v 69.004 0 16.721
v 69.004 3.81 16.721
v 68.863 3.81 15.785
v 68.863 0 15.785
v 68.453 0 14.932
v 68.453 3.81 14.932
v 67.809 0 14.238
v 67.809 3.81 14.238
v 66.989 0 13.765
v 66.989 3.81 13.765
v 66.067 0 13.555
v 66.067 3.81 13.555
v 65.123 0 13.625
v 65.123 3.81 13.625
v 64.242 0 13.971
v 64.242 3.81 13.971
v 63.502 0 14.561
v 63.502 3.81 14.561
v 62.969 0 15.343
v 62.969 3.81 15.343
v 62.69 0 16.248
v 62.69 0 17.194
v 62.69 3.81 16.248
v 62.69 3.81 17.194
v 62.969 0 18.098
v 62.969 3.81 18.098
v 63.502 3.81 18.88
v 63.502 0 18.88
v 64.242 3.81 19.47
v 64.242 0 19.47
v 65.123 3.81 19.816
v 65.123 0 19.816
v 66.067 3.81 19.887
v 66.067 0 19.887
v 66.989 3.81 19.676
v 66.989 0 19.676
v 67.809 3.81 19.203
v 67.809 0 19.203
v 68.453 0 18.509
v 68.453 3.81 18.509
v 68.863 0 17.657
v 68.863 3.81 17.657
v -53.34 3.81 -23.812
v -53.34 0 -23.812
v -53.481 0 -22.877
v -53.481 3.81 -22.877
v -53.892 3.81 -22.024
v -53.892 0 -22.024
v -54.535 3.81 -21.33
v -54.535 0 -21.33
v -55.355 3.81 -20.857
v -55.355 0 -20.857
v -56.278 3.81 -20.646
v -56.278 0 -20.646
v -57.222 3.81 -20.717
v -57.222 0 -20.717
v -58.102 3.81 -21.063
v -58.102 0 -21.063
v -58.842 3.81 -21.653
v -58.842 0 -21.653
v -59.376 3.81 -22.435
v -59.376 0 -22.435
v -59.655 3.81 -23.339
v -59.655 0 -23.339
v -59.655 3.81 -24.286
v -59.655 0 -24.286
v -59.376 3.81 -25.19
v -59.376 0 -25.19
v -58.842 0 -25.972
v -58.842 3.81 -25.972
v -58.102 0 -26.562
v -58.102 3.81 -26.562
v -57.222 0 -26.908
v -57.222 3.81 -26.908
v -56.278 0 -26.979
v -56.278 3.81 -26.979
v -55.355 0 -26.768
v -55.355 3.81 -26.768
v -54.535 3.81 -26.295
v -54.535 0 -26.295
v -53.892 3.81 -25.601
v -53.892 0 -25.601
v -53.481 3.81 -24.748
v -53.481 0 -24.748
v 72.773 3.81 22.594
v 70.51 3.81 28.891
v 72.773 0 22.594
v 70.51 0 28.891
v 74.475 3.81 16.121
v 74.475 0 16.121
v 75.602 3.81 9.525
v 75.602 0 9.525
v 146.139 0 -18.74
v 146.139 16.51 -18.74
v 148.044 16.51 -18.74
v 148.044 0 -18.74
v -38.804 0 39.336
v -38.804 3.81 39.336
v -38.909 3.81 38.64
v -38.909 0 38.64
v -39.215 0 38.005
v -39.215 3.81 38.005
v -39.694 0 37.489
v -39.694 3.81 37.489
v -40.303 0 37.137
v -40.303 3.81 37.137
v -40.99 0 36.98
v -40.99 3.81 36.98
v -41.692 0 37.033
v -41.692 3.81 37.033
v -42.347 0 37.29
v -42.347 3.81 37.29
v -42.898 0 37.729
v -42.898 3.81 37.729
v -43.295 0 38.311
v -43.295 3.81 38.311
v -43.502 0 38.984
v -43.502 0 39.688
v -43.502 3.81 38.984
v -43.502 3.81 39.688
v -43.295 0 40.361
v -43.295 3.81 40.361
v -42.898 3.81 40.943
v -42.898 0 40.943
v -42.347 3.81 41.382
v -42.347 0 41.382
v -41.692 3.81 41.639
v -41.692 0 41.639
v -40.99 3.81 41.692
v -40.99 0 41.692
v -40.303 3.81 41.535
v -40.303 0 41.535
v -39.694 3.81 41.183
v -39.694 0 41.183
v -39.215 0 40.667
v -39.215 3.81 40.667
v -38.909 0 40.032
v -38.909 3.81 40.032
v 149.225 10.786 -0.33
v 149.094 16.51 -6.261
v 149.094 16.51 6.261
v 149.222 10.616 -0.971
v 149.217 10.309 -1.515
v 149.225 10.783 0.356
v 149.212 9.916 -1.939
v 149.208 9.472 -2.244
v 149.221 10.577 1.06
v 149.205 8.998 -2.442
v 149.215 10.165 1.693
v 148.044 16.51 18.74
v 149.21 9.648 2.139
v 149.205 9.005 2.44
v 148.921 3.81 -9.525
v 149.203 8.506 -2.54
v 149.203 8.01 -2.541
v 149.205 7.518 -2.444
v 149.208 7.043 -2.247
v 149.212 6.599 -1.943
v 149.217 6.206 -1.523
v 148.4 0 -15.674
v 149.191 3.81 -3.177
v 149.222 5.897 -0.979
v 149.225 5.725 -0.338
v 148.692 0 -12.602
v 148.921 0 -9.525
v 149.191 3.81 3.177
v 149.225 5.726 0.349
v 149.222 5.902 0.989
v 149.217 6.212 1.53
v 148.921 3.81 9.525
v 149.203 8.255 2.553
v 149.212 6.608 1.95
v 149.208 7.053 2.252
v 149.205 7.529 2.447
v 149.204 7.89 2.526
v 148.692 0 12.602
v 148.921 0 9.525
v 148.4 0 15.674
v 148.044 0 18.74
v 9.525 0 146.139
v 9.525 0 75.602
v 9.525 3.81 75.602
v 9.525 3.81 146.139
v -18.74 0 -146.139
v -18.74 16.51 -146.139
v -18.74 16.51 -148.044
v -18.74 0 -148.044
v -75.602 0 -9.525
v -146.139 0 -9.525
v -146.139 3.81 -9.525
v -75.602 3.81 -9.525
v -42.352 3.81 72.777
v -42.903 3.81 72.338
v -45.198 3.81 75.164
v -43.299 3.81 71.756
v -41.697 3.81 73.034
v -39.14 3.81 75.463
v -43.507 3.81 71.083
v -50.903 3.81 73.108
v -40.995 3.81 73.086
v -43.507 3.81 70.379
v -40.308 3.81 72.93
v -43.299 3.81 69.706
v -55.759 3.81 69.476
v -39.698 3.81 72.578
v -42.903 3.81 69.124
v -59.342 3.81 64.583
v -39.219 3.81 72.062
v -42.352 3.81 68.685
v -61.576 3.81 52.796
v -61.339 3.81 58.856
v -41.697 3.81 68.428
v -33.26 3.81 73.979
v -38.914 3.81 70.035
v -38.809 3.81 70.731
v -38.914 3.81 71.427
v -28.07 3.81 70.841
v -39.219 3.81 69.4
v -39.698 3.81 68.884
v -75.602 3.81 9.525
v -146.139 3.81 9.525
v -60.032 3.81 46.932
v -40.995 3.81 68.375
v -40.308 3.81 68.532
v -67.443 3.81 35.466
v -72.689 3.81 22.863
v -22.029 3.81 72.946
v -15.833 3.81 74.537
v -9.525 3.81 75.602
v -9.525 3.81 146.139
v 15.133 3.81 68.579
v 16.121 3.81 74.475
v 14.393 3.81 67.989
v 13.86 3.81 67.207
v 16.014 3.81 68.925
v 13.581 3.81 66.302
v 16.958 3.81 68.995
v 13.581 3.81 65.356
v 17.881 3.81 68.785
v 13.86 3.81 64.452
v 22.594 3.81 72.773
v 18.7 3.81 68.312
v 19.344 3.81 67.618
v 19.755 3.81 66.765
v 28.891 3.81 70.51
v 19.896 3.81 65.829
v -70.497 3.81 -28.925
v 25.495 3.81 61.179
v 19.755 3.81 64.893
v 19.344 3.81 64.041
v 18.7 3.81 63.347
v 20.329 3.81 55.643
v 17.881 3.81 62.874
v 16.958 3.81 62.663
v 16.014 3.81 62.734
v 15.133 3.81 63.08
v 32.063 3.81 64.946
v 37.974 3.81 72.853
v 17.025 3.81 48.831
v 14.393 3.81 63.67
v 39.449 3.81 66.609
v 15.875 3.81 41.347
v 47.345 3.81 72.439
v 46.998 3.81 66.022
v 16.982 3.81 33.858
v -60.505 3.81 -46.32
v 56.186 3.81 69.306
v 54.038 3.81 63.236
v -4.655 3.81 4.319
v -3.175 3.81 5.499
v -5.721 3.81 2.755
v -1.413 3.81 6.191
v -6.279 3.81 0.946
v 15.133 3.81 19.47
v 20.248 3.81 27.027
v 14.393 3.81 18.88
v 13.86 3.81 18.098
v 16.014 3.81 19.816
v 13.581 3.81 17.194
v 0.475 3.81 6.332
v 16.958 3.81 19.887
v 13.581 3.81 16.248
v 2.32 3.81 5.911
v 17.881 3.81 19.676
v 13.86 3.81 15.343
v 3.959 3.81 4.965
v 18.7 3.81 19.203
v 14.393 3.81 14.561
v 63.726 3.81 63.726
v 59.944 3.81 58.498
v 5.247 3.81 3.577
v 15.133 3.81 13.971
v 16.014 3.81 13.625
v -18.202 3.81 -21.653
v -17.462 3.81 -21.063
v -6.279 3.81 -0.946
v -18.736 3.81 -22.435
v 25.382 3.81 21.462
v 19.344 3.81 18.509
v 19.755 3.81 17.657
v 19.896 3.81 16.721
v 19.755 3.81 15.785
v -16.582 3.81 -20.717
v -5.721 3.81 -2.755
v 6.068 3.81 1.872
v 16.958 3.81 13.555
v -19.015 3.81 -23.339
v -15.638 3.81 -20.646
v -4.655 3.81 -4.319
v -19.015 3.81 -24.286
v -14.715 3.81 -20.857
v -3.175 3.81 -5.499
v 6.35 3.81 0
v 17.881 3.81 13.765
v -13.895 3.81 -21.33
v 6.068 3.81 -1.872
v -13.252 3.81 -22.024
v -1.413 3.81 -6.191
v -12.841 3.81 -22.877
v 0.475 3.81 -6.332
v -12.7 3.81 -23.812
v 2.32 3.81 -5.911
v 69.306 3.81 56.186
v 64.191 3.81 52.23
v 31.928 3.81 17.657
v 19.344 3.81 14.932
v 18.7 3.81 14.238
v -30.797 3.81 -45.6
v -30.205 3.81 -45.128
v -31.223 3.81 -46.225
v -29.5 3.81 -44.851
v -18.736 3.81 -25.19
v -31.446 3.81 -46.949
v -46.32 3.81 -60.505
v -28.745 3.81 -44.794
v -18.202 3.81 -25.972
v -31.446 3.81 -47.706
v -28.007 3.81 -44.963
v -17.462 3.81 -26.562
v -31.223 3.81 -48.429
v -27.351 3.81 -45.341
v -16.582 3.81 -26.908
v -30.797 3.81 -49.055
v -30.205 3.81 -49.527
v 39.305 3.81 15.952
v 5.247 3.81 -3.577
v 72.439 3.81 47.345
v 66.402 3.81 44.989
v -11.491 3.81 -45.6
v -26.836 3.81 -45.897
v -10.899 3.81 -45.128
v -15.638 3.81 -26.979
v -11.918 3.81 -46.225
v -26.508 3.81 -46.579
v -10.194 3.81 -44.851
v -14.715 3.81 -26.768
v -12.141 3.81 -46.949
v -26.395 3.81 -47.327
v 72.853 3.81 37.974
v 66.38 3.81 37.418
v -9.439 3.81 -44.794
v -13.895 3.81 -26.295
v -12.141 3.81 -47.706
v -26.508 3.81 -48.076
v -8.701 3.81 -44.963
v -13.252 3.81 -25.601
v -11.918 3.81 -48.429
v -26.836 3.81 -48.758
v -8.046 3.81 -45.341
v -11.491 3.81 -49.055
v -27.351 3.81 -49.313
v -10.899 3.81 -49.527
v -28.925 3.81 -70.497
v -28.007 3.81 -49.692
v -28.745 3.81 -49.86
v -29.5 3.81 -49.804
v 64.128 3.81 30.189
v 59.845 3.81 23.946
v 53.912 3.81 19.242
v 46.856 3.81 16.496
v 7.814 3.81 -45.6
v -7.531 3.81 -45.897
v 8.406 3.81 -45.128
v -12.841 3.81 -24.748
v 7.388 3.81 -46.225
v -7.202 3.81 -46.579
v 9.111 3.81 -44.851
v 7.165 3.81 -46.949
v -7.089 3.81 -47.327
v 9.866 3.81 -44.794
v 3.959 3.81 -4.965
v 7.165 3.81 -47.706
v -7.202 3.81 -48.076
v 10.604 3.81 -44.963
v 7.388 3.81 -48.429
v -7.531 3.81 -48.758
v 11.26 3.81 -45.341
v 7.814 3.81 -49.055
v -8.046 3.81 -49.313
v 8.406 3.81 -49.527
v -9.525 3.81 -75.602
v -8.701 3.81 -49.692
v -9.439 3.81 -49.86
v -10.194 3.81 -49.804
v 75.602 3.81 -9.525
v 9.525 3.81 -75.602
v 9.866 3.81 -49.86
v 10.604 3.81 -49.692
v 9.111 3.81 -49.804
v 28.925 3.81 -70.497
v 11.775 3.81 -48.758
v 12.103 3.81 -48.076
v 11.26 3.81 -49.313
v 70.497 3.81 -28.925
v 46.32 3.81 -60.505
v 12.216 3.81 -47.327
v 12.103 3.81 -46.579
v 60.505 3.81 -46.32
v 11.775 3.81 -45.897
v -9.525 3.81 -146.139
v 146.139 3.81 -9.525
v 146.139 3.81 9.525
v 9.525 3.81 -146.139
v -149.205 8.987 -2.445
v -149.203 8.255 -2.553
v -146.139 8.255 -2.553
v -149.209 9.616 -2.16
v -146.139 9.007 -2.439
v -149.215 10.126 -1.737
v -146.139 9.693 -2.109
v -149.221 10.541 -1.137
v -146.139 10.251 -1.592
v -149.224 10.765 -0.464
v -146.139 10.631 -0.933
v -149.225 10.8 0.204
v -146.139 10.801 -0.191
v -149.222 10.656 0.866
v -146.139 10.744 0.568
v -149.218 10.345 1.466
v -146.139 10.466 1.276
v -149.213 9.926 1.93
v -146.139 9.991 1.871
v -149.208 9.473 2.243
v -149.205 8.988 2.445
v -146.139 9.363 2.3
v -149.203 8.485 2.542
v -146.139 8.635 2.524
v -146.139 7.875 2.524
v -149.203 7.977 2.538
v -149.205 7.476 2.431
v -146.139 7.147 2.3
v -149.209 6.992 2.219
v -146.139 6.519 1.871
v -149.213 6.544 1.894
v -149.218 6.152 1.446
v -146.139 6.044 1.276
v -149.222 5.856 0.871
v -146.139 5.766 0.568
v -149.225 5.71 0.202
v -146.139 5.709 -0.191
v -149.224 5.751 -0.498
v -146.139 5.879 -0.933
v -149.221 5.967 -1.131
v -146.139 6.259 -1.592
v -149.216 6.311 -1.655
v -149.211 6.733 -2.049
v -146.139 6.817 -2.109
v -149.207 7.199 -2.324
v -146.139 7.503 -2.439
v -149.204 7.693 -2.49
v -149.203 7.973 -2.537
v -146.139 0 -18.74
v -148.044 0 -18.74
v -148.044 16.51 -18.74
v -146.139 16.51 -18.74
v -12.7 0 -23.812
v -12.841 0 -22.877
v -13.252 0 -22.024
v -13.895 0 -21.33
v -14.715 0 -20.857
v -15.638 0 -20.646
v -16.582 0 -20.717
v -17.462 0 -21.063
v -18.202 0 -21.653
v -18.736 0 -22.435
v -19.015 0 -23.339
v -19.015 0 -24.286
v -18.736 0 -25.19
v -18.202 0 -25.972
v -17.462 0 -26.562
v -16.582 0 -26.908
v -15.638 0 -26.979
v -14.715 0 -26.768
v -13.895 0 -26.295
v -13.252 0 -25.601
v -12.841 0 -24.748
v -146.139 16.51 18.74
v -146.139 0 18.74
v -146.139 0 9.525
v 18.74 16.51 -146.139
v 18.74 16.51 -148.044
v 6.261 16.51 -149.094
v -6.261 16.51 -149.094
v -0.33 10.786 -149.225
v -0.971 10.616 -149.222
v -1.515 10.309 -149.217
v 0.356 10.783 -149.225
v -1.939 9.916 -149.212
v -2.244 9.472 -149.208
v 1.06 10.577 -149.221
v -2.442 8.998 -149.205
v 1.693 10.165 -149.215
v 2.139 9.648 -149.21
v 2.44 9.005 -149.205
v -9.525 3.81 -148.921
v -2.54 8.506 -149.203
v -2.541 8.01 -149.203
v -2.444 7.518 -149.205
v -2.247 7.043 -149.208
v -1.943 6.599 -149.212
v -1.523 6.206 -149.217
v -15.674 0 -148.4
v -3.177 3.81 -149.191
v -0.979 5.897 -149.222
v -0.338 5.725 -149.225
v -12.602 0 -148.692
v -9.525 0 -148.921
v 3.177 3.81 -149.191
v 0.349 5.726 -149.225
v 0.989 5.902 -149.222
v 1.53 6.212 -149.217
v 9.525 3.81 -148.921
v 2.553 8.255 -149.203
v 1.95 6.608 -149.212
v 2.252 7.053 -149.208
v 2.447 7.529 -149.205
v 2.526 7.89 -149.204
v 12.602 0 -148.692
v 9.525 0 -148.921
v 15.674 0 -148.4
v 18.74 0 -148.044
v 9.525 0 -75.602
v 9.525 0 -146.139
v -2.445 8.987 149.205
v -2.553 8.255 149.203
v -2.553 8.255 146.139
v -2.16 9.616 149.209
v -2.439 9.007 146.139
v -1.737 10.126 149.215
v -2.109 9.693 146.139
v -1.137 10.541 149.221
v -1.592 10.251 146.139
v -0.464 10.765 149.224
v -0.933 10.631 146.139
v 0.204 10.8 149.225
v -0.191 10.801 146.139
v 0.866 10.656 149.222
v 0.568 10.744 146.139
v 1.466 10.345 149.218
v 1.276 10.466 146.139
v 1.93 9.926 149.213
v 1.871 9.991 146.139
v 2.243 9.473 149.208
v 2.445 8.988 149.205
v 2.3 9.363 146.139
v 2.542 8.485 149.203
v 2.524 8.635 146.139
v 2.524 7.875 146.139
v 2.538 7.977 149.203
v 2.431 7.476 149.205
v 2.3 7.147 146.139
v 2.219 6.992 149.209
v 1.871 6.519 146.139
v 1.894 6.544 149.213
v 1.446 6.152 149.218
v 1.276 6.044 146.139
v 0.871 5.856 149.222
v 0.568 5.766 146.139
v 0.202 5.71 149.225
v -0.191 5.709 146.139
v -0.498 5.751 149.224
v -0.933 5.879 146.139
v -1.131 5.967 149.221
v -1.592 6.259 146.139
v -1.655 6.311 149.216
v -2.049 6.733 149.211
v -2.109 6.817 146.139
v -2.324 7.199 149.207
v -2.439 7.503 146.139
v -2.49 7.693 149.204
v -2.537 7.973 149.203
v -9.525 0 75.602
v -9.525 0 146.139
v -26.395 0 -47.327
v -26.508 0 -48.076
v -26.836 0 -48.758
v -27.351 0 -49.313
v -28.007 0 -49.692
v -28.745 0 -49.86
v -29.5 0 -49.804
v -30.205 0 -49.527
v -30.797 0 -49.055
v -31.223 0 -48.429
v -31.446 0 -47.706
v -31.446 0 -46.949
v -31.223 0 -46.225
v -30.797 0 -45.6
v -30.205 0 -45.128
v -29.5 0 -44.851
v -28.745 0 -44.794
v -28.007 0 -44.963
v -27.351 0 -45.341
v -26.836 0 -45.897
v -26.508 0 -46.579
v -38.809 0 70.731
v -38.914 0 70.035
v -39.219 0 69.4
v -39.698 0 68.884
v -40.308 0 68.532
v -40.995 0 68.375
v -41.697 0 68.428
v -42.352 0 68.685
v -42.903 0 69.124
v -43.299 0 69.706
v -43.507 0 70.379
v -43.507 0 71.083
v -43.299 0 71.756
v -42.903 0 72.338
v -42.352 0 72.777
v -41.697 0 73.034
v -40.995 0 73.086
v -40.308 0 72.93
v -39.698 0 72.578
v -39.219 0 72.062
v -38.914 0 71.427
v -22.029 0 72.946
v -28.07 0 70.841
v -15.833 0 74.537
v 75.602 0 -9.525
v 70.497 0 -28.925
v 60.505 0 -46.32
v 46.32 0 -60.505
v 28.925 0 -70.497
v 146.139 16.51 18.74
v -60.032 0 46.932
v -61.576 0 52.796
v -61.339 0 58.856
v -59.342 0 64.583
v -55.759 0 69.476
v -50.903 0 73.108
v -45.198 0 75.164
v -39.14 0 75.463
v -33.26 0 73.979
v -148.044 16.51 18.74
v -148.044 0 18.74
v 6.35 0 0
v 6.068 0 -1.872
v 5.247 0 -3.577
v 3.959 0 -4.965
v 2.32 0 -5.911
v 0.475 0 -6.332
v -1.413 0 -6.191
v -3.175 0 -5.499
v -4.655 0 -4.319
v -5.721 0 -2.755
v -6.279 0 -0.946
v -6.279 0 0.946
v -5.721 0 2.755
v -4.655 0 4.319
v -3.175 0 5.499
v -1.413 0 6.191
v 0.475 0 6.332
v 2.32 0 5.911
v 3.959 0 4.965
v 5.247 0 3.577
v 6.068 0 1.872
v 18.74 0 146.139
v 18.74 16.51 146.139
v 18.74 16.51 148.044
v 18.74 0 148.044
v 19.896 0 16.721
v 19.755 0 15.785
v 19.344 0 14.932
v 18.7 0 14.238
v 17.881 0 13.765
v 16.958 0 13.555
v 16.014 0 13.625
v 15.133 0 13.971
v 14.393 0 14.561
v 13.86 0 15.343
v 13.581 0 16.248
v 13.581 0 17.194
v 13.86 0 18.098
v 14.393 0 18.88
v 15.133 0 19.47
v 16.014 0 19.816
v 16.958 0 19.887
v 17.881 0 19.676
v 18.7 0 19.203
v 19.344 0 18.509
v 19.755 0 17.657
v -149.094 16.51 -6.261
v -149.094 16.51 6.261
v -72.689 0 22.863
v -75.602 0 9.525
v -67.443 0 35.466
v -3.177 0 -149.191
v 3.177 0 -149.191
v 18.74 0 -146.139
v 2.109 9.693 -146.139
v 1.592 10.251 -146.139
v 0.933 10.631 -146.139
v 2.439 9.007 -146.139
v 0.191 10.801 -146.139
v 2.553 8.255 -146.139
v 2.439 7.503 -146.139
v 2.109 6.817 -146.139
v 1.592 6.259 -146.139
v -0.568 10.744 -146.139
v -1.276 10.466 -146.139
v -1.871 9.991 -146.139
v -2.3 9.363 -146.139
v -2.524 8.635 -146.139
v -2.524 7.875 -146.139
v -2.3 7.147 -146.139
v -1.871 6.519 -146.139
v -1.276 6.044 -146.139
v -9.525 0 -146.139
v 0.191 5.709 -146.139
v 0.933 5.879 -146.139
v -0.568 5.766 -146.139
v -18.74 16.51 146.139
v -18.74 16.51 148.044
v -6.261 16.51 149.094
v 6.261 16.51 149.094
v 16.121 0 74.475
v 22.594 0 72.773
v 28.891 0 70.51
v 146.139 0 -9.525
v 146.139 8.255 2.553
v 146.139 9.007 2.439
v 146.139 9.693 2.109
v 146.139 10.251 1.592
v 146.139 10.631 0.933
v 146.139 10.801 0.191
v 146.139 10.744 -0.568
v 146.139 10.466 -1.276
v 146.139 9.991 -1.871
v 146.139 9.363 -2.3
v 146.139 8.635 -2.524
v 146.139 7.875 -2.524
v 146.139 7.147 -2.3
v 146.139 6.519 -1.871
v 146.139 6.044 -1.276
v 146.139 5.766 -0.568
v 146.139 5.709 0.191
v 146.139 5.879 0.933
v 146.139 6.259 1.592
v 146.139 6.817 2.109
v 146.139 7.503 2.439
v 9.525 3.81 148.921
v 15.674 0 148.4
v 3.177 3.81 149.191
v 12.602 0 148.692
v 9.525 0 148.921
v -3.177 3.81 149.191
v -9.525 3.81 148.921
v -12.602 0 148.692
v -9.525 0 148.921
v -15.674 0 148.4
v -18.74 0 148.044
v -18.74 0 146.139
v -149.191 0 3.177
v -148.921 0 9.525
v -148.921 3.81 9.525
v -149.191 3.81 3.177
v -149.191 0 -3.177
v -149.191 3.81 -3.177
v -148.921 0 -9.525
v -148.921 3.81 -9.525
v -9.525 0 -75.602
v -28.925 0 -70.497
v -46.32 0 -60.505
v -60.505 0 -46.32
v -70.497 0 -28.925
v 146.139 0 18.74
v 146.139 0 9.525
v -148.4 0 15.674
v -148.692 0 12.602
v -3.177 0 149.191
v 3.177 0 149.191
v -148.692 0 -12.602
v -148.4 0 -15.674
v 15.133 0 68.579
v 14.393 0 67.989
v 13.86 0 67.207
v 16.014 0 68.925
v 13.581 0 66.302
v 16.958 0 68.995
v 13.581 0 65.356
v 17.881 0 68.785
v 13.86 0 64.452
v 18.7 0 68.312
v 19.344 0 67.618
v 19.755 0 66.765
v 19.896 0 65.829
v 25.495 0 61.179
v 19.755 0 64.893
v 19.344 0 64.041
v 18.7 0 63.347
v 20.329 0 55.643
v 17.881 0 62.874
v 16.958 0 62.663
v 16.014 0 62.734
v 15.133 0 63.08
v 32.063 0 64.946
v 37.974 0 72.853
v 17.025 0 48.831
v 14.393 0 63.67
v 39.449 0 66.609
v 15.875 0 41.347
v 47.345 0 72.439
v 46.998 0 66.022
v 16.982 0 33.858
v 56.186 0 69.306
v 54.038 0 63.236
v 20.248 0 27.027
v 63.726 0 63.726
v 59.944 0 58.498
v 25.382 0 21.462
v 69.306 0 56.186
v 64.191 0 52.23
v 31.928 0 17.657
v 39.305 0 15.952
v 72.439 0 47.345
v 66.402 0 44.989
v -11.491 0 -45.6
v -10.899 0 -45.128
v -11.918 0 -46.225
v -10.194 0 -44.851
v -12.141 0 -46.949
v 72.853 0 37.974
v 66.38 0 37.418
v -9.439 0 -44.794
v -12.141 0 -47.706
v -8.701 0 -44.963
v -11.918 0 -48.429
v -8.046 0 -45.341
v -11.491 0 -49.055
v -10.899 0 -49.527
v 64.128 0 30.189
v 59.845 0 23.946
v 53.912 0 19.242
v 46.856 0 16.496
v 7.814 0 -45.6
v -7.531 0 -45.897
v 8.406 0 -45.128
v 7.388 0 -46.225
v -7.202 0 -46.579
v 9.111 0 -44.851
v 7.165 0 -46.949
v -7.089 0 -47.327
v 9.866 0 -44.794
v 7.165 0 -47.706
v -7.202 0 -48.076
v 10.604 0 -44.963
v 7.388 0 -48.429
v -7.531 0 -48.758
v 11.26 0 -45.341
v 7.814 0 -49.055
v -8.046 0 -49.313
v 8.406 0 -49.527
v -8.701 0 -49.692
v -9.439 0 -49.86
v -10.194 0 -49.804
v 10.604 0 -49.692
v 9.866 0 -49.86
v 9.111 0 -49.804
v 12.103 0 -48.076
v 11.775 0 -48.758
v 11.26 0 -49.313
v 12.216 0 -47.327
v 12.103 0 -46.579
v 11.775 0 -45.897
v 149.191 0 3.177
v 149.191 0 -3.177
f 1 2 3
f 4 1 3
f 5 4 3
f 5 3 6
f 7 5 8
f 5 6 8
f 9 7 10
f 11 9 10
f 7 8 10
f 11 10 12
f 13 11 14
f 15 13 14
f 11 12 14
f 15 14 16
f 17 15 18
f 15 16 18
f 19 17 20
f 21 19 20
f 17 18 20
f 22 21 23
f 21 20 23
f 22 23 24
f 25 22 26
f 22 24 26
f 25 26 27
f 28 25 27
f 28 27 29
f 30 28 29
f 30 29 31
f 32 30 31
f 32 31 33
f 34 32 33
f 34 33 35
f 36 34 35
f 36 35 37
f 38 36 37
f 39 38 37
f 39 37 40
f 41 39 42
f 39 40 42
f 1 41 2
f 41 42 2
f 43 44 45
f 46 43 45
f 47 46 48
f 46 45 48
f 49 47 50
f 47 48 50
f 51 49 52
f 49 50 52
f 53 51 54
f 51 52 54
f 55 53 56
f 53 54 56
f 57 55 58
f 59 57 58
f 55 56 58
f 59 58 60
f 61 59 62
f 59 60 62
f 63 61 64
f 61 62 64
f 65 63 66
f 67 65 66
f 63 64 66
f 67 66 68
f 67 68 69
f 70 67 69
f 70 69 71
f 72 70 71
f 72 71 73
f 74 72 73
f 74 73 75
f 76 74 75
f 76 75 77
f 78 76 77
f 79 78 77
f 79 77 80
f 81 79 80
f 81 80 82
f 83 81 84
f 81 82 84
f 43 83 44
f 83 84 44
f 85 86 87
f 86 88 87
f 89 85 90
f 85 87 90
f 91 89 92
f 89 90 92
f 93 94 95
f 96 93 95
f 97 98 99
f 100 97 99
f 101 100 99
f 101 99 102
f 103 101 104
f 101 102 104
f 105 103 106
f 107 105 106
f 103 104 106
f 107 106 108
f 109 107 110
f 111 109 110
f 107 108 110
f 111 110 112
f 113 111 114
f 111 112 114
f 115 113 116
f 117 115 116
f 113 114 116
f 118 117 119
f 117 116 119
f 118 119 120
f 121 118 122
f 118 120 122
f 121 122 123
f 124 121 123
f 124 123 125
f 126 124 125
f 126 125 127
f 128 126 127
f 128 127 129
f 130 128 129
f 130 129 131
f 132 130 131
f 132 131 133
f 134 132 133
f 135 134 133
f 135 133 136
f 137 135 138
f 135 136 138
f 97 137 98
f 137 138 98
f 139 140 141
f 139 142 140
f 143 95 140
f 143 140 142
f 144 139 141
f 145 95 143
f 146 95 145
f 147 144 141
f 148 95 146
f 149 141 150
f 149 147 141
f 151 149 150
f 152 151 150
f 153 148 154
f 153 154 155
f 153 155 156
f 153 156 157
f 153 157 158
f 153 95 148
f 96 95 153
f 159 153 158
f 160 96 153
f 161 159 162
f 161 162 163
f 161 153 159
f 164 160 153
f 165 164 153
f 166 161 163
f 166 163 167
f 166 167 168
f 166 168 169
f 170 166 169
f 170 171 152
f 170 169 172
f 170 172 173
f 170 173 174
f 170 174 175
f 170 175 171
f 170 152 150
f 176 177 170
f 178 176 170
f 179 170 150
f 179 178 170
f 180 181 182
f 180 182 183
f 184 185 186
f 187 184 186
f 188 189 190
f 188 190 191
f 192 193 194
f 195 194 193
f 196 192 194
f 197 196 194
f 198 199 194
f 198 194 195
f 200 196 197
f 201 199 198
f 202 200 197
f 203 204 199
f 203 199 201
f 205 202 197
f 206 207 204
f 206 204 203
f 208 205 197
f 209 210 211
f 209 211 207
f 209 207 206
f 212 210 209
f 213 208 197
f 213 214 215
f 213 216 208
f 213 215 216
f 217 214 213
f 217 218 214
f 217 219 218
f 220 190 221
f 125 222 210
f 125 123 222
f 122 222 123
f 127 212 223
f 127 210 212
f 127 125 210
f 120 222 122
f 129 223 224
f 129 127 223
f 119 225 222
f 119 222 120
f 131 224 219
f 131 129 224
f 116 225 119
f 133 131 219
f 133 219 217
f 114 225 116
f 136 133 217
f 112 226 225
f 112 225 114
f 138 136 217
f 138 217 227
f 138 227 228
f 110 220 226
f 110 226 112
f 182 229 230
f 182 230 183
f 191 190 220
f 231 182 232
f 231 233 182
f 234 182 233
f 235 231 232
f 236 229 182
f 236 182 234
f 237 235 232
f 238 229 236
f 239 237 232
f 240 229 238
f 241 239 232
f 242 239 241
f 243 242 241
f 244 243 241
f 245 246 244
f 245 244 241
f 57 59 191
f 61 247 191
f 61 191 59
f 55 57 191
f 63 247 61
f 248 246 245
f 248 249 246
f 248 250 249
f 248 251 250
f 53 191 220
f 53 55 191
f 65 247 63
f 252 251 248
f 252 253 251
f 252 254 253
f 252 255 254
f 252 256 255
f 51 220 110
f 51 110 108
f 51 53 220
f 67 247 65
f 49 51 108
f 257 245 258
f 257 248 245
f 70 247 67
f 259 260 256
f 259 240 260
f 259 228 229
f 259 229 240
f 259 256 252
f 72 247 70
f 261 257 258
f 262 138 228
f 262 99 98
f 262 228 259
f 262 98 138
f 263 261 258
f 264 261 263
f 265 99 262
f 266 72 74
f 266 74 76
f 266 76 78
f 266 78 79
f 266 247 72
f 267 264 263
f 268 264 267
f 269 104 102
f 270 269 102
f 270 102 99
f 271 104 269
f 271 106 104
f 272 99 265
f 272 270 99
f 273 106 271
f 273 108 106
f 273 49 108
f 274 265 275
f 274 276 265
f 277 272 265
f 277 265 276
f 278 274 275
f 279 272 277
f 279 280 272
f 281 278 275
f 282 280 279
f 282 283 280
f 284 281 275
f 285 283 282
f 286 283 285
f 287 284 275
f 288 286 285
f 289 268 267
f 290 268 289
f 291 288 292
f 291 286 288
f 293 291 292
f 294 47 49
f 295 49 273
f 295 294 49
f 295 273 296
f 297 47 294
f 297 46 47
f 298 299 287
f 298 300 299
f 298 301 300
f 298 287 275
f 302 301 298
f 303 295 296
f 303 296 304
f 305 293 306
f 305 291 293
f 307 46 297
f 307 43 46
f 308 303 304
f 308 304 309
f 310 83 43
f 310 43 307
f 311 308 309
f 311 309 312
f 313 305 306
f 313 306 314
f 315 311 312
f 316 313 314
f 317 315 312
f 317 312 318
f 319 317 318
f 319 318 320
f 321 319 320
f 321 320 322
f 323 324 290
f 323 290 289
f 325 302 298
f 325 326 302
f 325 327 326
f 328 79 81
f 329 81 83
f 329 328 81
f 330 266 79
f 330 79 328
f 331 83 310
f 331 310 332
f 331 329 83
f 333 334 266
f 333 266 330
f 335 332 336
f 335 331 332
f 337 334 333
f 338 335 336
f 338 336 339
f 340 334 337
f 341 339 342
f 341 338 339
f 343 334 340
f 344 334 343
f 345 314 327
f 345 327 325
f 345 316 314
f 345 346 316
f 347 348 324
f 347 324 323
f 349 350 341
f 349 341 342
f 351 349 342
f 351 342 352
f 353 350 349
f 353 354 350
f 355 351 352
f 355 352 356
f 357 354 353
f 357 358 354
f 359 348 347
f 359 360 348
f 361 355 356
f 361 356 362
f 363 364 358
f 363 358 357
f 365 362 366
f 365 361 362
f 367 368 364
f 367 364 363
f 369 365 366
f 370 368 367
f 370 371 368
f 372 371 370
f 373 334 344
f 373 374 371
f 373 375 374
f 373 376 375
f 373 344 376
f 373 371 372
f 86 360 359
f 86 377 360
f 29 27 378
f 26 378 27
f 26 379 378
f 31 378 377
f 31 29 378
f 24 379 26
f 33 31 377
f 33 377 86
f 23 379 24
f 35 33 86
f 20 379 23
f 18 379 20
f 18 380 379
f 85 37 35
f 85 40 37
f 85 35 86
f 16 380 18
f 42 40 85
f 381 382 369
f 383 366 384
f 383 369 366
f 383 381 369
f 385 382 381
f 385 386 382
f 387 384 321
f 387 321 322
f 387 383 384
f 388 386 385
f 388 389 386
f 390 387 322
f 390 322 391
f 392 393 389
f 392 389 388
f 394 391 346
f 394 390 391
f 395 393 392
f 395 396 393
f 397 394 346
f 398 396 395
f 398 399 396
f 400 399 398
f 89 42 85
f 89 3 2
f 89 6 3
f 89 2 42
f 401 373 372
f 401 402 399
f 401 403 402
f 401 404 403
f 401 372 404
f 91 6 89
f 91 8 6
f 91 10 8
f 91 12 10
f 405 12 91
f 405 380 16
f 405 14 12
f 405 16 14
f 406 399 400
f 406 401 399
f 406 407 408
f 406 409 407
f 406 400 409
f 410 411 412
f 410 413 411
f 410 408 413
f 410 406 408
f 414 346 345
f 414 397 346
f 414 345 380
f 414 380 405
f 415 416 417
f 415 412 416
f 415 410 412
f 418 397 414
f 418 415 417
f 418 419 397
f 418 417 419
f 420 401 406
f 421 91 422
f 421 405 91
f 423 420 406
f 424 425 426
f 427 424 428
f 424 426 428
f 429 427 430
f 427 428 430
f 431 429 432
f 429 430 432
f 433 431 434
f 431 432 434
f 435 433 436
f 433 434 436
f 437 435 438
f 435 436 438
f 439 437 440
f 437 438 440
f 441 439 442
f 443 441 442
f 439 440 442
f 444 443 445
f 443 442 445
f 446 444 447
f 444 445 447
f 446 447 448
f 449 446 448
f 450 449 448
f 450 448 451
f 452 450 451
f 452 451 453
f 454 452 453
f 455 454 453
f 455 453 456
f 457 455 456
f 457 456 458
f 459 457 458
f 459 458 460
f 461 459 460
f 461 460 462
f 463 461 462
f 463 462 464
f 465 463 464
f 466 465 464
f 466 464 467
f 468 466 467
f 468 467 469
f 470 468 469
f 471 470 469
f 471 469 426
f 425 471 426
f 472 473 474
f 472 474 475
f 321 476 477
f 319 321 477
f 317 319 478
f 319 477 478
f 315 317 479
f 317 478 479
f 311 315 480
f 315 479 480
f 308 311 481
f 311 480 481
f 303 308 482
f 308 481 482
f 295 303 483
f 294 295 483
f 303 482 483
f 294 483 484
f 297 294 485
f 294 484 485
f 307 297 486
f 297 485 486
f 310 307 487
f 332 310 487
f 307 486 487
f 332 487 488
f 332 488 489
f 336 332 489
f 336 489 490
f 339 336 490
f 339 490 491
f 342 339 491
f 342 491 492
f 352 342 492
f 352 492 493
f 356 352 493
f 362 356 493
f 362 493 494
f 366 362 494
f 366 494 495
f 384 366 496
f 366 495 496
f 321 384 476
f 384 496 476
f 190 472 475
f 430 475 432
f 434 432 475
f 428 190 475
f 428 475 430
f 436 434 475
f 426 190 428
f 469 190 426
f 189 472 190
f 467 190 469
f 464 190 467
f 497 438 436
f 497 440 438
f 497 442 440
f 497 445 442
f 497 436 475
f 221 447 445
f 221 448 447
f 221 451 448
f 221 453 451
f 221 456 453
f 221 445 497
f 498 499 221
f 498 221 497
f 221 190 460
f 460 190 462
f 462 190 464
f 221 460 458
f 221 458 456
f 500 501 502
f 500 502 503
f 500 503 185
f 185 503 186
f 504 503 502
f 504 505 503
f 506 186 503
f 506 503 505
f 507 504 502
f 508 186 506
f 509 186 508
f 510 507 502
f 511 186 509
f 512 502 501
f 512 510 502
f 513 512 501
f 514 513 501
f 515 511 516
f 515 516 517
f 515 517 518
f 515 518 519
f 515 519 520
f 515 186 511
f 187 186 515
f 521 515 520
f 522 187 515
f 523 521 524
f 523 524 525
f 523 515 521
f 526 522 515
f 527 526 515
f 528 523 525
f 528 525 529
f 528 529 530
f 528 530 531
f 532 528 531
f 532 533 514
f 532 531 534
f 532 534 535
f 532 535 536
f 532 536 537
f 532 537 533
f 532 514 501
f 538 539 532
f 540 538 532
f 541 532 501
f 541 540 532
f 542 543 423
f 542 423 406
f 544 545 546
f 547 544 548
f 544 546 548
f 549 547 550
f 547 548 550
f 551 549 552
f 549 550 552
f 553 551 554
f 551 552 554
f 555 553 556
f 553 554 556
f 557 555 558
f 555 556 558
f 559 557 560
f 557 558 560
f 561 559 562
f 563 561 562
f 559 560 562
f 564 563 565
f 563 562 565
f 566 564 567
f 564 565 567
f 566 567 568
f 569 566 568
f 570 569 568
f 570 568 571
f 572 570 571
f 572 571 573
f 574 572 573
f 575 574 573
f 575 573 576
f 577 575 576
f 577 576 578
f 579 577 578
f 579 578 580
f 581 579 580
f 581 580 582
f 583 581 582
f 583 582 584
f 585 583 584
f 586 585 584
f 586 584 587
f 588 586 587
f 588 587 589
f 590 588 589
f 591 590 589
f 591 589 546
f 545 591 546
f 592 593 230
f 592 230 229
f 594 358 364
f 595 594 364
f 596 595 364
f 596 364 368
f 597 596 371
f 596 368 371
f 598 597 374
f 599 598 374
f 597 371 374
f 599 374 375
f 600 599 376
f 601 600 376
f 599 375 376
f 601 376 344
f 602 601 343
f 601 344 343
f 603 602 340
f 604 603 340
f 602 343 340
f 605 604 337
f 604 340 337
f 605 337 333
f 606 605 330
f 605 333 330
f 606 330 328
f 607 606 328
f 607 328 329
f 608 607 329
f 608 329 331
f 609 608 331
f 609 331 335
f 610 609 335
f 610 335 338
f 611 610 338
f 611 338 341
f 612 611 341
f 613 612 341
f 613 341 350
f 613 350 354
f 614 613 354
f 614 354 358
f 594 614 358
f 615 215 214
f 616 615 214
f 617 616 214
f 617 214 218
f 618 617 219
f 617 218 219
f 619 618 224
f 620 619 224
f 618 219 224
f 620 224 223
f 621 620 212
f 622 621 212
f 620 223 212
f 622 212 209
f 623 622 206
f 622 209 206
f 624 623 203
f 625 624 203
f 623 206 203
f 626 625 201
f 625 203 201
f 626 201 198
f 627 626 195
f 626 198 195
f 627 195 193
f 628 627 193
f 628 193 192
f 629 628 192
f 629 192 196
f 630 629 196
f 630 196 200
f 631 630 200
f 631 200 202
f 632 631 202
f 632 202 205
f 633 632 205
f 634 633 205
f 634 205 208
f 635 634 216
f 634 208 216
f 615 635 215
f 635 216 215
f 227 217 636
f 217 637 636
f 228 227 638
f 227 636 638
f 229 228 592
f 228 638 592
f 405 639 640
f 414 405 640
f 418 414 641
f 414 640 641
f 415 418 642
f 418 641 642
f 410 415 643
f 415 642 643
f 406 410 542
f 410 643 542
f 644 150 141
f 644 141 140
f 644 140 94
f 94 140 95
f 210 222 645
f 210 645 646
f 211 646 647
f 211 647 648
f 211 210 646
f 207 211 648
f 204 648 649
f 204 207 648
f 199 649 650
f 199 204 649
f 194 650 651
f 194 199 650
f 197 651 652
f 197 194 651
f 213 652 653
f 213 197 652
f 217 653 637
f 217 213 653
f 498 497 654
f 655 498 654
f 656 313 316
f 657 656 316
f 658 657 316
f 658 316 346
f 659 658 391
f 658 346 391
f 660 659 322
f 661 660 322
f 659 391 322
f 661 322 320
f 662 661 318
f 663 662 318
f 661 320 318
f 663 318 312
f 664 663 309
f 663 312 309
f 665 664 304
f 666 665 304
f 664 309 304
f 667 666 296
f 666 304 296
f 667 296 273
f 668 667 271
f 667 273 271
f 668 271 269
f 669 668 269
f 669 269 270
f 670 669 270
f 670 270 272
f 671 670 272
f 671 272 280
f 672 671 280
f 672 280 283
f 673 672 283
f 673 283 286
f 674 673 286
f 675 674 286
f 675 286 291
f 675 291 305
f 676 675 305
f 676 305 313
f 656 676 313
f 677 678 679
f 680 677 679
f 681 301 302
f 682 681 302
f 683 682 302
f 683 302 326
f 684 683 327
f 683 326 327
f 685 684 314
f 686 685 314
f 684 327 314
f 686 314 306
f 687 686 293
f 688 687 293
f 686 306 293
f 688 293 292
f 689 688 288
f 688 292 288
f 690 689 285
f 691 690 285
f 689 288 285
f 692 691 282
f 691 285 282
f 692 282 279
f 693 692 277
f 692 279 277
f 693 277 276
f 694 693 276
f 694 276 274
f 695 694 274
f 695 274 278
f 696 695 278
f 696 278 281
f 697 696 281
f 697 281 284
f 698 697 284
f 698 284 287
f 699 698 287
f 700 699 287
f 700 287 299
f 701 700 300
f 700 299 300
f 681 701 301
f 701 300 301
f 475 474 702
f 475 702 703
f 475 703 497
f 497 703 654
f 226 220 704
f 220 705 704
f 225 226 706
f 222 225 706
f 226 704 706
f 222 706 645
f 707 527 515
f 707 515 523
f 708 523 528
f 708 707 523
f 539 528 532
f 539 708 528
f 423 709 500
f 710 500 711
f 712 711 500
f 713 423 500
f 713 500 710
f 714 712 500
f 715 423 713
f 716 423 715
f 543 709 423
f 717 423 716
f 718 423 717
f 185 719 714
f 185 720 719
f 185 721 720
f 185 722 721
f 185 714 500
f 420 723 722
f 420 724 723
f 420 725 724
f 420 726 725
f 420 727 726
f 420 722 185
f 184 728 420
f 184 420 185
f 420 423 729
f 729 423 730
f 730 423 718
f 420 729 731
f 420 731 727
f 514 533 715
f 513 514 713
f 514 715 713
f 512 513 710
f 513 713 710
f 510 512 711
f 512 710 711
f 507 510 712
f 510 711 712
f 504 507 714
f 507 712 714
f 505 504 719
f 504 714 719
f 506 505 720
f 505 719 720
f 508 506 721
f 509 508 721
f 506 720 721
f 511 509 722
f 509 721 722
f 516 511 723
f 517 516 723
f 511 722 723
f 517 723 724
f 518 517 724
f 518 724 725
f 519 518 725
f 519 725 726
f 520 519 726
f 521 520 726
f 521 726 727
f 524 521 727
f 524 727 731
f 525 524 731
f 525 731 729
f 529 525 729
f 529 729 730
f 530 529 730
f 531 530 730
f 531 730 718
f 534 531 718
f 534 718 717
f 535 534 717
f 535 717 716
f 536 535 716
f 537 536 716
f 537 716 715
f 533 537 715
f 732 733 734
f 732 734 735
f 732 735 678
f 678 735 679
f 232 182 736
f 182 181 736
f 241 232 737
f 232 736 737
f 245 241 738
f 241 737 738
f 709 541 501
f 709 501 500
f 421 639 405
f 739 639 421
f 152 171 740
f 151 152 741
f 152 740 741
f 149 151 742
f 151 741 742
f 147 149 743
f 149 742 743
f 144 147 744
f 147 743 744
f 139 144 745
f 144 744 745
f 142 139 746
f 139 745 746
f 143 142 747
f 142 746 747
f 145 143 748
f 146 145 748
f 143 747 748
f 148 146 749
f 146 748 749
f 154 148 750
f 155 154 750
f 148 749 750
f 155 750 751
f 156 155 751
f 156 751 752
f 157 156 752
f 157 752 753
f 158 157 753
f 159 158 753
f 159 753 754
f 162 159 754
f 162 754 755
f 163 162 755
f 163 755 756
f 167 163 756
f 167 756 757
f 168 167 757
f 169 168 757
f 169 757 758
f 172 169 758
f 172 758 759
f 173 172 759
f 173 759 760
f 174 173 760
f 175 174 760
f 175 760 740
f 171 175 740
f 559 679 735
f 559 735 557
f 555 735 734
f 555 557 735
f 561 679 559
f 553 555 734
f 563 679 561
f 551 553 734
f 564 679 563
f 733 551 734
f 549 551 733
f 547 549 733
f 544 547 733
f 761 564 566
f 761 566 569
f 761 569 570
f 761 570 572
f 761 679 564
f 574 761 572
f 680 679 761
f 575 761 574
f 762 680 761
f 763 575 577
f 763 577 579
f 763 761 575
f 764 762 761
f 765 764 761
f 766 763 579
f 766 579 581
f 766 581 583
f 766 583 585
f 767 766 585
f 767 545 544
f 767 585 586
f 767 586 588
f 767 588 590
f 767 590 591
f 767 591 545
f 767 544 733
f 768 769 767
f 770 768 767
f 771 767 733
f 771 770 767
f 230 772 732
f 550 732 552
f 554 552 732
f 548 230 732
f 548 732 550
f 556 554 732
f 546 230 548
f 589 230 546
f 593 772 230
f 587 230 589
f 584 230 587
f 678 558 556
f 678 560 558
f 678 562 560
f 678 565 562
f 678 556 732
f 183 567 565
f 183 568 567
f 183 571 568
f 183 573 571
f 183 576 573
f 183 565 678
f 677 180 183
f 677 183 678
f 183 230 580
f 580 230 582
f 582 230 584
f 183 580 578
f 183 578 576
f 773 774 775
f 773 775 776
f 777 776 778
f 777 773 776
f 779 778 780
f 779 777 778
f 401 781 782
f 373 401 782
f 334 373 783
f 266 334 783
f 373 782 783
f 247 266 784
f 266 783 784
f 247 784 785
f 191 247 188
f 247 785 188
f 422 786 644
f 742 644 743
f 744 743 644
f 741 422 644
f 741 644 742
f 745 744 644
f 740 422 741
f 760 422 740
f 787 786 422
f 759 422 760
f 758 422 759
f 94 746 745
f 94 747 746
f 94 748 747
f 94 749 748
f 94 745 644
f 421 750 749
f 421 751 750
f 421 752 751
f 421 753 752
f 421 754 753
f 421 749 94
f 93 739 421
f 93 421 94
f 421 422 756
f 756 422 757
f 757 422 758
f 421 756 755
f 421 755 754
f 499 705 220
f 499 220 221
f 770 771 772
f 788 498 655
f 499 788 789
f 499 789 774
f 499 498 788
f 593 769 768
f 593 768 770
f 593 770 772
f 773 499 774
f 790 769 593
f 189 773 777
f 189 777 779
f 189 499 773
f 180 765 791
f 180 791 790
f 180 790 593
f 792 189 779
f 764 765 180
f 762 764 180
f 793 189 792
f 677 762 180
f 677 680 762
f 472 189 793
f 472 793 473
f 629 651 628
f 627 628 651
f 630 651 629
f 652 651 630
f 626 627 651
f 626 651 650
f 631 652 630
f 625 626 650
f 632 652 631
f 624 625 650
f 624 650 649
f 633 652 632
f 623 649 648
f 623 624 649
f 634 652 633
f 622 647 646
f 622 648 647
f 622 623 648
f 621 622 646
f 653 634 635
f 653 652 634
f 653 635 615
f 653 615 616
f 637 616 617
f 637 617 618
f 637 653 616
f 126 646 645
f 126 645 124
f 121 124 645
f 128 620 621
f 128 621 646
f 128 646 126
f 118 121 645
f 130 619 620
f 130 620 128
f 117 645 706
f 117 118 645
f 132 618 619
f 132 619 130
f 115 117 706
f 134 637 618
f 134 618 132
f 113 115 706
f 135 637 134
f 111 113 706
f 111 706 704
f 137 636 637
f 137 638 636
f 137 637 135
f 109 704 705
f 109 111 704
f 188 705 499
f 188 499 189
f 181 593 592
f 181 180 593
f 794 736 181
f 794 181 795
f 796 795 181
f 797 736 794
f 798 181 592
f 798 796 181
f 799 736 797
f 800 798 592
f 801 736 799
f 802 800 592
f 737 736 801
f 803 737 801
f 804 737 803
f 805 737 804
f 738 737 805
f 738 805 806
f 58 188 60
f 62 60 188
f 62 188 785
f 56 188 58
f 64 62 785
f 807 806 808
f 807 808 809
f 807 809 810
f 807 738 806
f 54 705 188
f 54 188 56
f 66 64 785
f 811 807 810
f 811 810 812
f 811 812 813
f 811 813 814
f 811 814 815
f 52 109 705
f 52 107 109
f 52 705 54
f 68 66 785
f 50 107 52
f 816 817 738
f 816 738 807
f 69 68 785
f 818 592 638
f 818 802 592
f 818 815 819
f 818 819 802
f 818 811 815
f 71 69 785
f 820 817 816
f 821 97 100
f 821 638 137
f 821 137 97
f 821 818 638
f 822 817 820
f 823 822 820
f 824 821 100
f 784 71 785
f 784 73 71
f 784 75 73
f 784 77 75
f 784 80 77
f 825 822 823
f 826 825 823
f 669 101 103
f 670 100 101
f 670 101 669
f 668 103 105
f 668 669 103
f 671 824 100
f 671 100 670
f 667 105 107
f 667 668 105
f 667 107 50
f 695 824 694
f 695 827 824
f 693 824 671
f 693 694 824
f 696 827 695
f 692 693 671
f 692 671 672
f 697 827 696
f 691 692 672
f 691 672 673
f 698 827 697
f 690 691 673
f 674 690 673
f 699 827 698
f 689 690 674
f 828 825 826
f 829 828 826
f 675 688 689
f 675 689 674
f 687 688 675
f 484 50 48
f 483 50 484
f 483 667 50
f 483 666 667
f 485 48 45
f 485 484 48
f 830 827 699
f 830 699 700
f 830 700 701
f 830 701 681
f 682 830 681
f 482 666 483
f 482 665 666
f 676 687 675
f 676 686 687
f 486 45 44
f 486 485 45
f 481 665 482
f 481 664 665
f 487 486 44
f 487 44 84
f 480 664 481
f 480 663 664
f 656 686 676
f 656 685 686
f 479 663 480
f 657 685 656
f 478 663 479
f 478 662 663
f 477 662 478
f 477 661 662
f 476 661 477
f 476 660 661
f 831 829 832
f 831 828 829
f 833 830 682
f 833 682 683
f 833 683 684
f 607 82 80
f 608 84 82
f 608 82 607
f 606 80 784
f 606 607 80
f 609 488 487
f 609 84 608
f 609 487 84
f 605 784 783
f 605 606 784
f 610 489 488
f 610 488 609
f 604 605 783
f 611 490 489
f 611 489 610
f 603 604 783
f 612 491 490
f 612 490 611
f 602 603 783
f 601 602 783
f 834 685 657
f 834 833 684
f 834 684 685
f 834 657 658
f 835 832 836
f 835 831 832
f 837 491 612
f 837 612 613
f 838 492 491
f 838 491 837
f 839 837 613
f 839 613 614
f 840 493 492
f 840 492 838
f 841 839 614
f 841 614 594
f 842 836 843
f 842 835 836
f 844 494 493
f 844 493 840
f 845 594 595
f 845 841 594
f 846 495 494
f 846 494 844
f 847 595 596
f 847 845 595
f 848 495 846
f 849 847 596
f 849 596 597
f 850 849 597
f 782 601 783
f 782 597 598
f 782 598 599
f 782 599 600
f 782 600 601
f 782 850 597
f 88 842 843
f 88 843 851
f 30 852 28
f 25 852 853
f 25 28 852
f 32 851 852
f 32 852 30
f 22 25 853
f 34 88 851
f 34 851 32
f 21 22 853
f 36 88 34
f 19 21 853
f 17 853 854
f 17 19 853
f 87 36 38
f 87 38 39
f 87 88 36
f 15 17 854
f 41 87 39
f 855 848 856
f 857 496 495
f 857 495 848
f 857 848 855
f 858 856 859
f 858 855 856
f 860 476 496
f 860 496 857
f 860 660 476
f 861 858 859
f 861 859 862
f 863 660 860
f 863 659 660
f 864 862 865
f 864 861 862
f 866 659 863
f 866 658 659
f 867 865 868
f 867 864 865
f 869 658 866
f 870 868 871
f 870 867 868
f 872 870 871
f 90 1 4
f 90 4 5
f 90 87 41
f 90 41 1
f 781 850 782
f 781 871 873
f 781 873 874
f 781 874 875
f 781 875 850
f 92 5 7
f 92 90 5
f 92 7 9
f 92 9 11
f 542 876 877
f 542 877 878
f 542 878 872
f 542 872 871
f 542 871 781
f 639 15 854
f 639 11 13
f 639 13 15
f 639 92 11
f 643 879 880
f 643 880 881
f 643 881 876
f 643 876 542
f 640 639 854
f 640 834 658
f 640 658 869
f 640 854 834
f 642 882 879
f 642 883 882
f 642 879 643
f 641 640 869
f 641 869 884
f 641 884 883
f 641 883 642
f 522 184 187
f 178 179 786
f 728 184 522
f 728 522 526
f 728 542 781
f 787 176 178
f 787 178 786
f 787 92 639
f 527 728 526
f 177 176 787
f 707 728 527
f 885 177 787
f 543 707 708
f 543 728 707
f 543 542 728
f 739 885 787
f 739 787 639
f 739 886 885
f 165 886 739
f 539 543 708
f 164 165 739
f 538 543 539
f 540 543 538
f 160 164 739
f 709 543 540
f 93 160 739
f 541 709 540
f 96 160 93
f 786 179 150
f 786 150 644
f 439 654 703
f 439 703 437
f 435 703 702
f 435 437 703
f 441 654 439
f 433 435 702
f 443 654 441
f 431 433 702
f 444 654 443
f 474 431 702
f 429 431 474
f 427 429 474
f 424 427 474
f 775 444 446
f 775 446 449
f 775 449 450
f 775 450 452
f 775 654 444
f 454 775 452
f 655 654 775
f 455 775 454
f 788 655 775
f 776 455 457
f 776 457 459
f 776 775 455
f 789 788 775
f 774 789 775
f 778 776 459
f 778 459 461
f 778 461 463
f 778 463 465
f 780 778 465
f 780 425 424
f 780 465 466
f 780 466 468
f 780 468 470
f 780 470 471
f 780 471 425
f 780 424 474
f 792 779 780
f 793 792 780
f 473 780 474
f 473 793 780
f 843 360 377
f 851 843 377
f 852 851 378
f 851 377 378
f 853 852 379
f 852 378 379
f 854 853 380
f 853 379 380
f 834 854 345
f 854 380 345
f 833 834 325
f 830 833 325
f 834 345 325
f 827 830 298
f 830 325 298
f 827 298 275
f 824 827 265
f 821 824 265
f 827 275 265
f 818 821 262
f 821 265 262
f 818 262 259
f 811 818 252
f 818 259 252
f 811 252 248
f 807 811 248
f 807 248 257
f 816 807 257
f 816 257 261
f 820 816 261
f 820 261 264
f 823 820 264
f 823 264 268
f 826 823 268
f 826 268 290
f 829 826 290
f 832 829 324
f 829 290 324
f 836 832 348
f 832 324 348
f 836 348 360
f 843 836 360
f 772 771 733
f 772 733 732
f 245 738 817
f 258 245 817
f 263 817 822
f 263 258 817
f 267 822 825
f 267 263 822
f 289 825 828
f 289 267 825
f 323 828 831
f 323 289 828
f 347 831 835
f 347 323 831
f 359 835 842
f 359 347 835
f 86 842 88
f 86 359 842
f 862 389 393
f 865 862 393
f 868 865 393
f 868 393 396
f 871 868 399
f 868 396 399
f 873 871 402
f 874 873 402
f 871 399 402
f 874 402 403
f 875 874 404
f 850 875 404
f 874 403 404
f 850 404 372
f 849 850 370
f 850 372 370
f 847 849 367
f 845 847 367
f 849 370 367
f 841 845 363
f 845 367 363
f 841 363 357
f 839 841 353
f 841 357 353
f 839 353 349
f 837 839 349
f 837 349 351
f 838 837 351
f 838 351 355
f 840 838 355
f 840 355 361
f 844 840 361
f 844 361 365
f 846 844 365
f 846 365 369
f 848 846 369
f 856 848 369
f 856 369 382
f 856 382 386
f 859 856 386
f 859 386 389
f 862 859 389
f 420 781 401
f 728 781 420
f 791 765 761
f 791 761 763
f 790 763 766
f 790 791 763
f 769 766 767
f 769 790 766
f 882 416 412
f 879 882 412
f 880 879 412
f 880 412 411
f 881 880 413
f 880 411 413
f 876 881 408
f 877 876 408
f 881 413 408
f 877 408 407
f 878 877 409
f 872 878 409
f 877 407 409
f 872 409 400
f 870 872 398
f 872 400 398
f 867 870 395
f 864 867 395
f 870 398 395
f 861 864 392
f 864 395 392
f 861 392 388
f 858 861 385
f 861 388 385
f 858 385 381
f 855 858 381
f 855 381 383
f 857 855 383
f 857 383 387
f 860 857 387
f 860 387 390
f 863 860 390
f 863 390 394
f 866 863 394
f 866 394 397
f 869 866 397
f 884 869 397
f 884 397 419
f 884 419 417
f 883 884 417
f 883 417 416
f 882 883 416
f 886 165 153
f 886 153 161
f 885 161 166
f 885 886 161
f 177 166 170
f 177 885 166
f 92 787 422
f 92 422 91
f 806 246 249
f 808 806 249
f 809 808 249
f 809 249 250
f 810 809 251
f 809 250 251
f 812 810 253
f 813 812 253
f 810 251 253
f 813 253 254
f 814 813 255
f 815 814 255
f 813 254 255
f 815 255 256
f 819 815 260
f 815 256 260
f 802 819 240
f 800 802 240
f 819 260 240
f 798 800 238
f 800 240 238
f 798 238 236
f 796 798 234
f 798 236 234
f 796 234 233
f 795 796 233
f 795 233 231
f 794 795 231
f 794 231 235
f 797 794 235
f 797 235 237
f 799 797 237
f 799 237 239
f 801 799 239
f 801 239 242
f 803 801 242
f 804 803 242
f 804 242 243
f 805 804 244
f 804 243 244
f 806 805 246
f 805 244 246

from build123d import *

# Parameters (mm, degrees)
SKETCH1_R                       = 76.2
BOSS_EXTRUDE1_DEPTH             = 3.81
BOSS_EXTRUDE3_DEPTH             = 3.81
SKETCH5_R                       = 6.35
CUT_EXTRUDE1_DEPTH              = 4.81
BOSS_EXTRUDE4_START             = -3.81
BOSS_EXTRUDE4_DEPTH             = 16.51
SKETCH9_R                       = 3.174999999
CUT_EXTRUDE4_DEPTH              = 3.81
SKETCH11_R                      = 31.75
SKETCH11_R_2                    = 25.4
BOSS_EXTRUDE5_DEPTH             = 3.81
SKETCH12_R                      = 25.4
CUT_EXTRUDE5_DEPTH              = 3.81
SKETCH13_R                      = 20.52955
SKETCH13_R_2                    = 2.3622
BOSS_EXTRUDE7_DEPTH             = 3.81
SKETCH14_R                      = 2.3622
CUT_EXTRUDE6_DEPTH              = 3.81
SKETCH15_R                      = 3.175
CUT_EXTRUDE7_DEPTH              = 3.81
TAP_DRILL_FOR_1_4_20_TAP1_D     = 5.1054
TAP_DRILL_FOR_1_4_20_TAP1_DEPTH = 3.087343788
CIRPATTERN1_COUNT               = 4
SKETCH22_R                      = 2.54
CUT_EXTRUDE8_DEPTH              = 17.78


with BuildPart() as part:
    # Sketch1 → Boss-Extrude1 (new body)
    with BuildSketch(Plane(origin=(0, 0, 0), x_dir=(1, 0, 0), z_dir=(0, 1, 0))):
        Circle(SKETCH1_R)
    extrude(amount=BOSS_EXTRUDE1_DEPTH)

    # Sketch3 → Boss-Extrude3 (add)
    with BuildSketch(Plane(origin=(0, 0, 0), x_dir=(-1, 0, 0), z_dir=(0, -1, 0))):
        with BuildLine():
            Line((9.525, -9.525), (148.920700374, -9.525))
            ThreePointArc((148.920700374, -9.525), (149.225, 0), (148.920700374, 9.525))
            Line((148.920700374, 9.525), (9.525, 9.525))
            Line((9.525, 9.525), (9.525, 148.920700374))
            ThreePointArc((9.525, 148.920700374), (0, 149.225), (-9.525, 148.920700374))
            Line((-9.525, 148.920700374), (-9.525, 9.525))
            Line((-9.525, 9.525), (-148.920700374, 9.525))
            ThreePointArc((-148.920700374, 9.525), (-149.225, 0), (-148.920700374, -9.525))
            Line((-148.920700374, -9.525), (-9.525, -9.525))
            Line((-9.525, -9.525), (-9.525, -148.920700374))
            ThreePointArc((-9.525, -148.920700374), (0, -149.225), (9.525, -148.920700374))
            Line((9.525, -148.920700374), (9.525, -9.525))
        make_face()
    extrude(amount=-BOSS_EXTRUDE3_DEPTH)

    # Sketch5 → Cut-Extrude1 (cut, through all)
    with BuildSketch(Plane(origin=(0, 3.81, 0), x_dir=(1, 0, 0), z_dir=(0, 1, 0))):
        Circle(SKETCH5_R)
    extrude(amount=-CUT_EXTRUDE1_DEPTH, mode=Mode.SUBTRACT)

    # Sketch7 → Boss-Extrude4 (add)
    with BuildSketch(Plane(origin=(0, 3.81, 0), x_dir=(1, 0, 0), z_dir=(0, 1, 0)).offset(BOSS_EXTRUDE4_START)):
        with BuildLine():
            Line((18.739703318, 148.043656212), (18.739703318, 146.138656212))
            Line((18.739703318, 146.138656212), (-18.739703318, 146.138656212))
            Line((-18.739703318, 146.138656212), (-18.739703318, 148.043656212))
            ThreePointArc((-18.739703318, 148.043656212), (0, 149.225), (18.739703318, 148.043656212))
        make_face()
    boss_extrude4 = extrude(amount=BOSS_EXTRUDE4_DEPTH)

    # Sketch9 → Cut-Extrude4 (cut)
    with BuildSketch(Plane.XZ):
        with Locations((-56.514999999, -23.8125)):
            Circle(SKETCH9_R)
        with Locations((-15.874999999, -23.8125)):
            Circle(SKETCH9_R)
    extrude(amount=-CUT_EXTRUDE4_DEPTH, mode=Mode.SUBTRACT)

    # Sketch11 → Boss-Extrude5 (add)
    with BuildSketch(Plane(origin=(0, 3.81, 0), x_dir=(1, 0, 0), z_dir=(0, 1, 0))):
        with Locations((41.275, -41.275)):
            Circle(SKETCH11_R)
        with Locations((41.275, -41.275)):
            Circle(SKETCH11_R_2, mode=Mode.SUBTRACT)
    extrude(amount=-BOSS_EXTRUDE5_DEPTH)

    # Sketch12 → Cut-Extrude5 (cut)
    with BuildSketch(Plane(origin=(0, 3.81, 0), x_dir=(1, 0, 0), z_dir=(0, 1, 0))):
        with Locations((41.275, -41.275)):
            Circle(SKETCH12_R)
    extrude(amount=-CUT_EXTRUDE5_DEPTH, mode=Mode.SUBTRACT)

    # Sketch13 → Boss-Extrude7 (add)
    with BuildSketch(Plane(origin=(0, 3.81, 0), x_dir=(1, 0, 0), z_dir=(0, 1, 0))):
        with Locations((-41.16870274, -55.03340443)):
            Circle(SKETCH13_R)
        with Locations((-41.17109409, -70.730891948)):
            Circle(SKETCH13_R_2, mode=Mode.SUBTRACT)
        with Locations((-41.166311391, -39.335916913)):
            Circle(SKETCH13_R_2, mode=Mode.SUBTRACT)
    extrude(amount=-BOSS_EXTRUDE7_DEPTH)

    # Sketch14 → Cut-Extrude6 (cut)
    with BuildSketch(Plane(origin=(0, 3.81, 0), x_dir=(1, 0, 0), z_dir=(0, 1, 0))):
        with Locations((-41.166311391, -39.335916913)):
            Circle(SKETCH14_R)
    extrude(amount=-CUT_EXTRUDE6_DEPTH, mode=Mode.SUBTRACT)

    # Sketch15 → Cut-Extrude7 (cut)
    with BuildSketch(Plane(origin=(0, 3.81, 0), x_dir=(1, 0, 0), z_dir=(0, 1, 0))):
        with Locations((16.720717023, -16.720717023)):
            Circle(SKETCH15_R)
        with Locations((65.829282977, -16.720717023)):
            Circle(SKETCH15_R)
        with Locations((16.720717023, -65.829282977)):
            Circle(SKETCH15_R)
    extrude(amount=-CUT_EXTRUDE7_DEPTH, mode=Mode.SUBTRACT)

    # Tap Drill for 1/4-20 Tap1
    with Locations(Plane(origin=(0, 0, -149.225), x_dir=(-1, 0, 0), z_dir=(0, 0, -1))):
        with Locations((0, 8.255)):
            tap_drill_for_1_4_20_tap1 = Hole(TAP_DRILL_FOR_1_4_20_TAP1_D / 2, depth=TAP_DRILL_FOR_1_4_20_TAP1_DEPTH)

    # CirPattern1: Boss-Extrude4, Tap Drill for 1/4-20 Tap1 ×4 about axis
    cirpattern1_axis = Axis((0, 0, 0), (0, 1, 0))
    for i in range(1, CIRPATTERN1_COUNT):
        add(boss_extrude4.rotate(cirpattern1_axis, i * 360 / CIRPATTERN1_COUNT))
        add(tap_drill_for_1_4_20_tap1.rotate(cirpattern1_axis, i * 360 / CIRPATTERN1_COUNT), mode=Mode.SUBTRACT)

    # Sketch22 → Cut-Extrude8 (cut)
    with BuildSketch(Plane(origin=(0, 3.81, 0), x_dir=(1, 0, 0), z_dir=(0, 1, 0))):
        with Locations((9.676222664, 47.327342728)):
            Circle(SKETCH22_R)
        with Locations((-9.629274443, 47.327342728)):
            Circle(SKETCH22_R)
        with Locations((-28.93477155, 47.327342728)):
            Circle(SKETCH22_R)
    extrude(amount=-CUT_EXTRUDE8_DEPTH, mode=Mode.SUBTRACT)


solid = part.part
